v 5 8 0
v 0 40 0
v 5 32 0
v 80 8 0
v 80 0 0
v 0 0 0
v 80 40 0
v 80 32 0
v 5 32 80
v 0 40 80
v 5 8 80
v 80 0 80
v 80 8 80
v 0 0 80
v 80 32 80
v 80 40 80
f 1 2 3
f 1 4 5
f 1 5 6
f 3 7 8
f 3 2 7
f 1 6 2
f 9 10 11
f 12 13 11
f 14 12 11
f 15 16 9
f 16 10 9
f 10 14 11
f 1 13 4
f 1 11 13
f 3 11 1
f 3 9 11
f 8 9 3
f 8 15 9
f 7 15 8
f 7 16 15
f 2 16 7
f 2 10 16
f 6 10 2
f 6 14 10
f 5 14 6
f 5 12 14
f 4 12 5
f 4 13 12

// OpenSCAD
$fn = 32;

// ----------------------------------------------------------------------
// Structural section: channel 80 x 40 mm
// ----------------------------------------------------------------------

// --- parameters (mm) ---
sec_w = 80;               // channel width, X
sec_h = 40;               // channel height, Y
flange_t = 8;             // flange thickness
web_t = 5;                // web thickness
plate_t = 80;             // cut length, Z (extrusion height)

profile = [[0, 0], [80, 0], [80, 8], [5, 8], [5, 32], [80, 32], [80, 40], [0, 40]];  // primary outline, 8 points, counter clockwise

// --- the one profile operation ---
linear_extrude(height = plate_t) polygon(points = profile);
